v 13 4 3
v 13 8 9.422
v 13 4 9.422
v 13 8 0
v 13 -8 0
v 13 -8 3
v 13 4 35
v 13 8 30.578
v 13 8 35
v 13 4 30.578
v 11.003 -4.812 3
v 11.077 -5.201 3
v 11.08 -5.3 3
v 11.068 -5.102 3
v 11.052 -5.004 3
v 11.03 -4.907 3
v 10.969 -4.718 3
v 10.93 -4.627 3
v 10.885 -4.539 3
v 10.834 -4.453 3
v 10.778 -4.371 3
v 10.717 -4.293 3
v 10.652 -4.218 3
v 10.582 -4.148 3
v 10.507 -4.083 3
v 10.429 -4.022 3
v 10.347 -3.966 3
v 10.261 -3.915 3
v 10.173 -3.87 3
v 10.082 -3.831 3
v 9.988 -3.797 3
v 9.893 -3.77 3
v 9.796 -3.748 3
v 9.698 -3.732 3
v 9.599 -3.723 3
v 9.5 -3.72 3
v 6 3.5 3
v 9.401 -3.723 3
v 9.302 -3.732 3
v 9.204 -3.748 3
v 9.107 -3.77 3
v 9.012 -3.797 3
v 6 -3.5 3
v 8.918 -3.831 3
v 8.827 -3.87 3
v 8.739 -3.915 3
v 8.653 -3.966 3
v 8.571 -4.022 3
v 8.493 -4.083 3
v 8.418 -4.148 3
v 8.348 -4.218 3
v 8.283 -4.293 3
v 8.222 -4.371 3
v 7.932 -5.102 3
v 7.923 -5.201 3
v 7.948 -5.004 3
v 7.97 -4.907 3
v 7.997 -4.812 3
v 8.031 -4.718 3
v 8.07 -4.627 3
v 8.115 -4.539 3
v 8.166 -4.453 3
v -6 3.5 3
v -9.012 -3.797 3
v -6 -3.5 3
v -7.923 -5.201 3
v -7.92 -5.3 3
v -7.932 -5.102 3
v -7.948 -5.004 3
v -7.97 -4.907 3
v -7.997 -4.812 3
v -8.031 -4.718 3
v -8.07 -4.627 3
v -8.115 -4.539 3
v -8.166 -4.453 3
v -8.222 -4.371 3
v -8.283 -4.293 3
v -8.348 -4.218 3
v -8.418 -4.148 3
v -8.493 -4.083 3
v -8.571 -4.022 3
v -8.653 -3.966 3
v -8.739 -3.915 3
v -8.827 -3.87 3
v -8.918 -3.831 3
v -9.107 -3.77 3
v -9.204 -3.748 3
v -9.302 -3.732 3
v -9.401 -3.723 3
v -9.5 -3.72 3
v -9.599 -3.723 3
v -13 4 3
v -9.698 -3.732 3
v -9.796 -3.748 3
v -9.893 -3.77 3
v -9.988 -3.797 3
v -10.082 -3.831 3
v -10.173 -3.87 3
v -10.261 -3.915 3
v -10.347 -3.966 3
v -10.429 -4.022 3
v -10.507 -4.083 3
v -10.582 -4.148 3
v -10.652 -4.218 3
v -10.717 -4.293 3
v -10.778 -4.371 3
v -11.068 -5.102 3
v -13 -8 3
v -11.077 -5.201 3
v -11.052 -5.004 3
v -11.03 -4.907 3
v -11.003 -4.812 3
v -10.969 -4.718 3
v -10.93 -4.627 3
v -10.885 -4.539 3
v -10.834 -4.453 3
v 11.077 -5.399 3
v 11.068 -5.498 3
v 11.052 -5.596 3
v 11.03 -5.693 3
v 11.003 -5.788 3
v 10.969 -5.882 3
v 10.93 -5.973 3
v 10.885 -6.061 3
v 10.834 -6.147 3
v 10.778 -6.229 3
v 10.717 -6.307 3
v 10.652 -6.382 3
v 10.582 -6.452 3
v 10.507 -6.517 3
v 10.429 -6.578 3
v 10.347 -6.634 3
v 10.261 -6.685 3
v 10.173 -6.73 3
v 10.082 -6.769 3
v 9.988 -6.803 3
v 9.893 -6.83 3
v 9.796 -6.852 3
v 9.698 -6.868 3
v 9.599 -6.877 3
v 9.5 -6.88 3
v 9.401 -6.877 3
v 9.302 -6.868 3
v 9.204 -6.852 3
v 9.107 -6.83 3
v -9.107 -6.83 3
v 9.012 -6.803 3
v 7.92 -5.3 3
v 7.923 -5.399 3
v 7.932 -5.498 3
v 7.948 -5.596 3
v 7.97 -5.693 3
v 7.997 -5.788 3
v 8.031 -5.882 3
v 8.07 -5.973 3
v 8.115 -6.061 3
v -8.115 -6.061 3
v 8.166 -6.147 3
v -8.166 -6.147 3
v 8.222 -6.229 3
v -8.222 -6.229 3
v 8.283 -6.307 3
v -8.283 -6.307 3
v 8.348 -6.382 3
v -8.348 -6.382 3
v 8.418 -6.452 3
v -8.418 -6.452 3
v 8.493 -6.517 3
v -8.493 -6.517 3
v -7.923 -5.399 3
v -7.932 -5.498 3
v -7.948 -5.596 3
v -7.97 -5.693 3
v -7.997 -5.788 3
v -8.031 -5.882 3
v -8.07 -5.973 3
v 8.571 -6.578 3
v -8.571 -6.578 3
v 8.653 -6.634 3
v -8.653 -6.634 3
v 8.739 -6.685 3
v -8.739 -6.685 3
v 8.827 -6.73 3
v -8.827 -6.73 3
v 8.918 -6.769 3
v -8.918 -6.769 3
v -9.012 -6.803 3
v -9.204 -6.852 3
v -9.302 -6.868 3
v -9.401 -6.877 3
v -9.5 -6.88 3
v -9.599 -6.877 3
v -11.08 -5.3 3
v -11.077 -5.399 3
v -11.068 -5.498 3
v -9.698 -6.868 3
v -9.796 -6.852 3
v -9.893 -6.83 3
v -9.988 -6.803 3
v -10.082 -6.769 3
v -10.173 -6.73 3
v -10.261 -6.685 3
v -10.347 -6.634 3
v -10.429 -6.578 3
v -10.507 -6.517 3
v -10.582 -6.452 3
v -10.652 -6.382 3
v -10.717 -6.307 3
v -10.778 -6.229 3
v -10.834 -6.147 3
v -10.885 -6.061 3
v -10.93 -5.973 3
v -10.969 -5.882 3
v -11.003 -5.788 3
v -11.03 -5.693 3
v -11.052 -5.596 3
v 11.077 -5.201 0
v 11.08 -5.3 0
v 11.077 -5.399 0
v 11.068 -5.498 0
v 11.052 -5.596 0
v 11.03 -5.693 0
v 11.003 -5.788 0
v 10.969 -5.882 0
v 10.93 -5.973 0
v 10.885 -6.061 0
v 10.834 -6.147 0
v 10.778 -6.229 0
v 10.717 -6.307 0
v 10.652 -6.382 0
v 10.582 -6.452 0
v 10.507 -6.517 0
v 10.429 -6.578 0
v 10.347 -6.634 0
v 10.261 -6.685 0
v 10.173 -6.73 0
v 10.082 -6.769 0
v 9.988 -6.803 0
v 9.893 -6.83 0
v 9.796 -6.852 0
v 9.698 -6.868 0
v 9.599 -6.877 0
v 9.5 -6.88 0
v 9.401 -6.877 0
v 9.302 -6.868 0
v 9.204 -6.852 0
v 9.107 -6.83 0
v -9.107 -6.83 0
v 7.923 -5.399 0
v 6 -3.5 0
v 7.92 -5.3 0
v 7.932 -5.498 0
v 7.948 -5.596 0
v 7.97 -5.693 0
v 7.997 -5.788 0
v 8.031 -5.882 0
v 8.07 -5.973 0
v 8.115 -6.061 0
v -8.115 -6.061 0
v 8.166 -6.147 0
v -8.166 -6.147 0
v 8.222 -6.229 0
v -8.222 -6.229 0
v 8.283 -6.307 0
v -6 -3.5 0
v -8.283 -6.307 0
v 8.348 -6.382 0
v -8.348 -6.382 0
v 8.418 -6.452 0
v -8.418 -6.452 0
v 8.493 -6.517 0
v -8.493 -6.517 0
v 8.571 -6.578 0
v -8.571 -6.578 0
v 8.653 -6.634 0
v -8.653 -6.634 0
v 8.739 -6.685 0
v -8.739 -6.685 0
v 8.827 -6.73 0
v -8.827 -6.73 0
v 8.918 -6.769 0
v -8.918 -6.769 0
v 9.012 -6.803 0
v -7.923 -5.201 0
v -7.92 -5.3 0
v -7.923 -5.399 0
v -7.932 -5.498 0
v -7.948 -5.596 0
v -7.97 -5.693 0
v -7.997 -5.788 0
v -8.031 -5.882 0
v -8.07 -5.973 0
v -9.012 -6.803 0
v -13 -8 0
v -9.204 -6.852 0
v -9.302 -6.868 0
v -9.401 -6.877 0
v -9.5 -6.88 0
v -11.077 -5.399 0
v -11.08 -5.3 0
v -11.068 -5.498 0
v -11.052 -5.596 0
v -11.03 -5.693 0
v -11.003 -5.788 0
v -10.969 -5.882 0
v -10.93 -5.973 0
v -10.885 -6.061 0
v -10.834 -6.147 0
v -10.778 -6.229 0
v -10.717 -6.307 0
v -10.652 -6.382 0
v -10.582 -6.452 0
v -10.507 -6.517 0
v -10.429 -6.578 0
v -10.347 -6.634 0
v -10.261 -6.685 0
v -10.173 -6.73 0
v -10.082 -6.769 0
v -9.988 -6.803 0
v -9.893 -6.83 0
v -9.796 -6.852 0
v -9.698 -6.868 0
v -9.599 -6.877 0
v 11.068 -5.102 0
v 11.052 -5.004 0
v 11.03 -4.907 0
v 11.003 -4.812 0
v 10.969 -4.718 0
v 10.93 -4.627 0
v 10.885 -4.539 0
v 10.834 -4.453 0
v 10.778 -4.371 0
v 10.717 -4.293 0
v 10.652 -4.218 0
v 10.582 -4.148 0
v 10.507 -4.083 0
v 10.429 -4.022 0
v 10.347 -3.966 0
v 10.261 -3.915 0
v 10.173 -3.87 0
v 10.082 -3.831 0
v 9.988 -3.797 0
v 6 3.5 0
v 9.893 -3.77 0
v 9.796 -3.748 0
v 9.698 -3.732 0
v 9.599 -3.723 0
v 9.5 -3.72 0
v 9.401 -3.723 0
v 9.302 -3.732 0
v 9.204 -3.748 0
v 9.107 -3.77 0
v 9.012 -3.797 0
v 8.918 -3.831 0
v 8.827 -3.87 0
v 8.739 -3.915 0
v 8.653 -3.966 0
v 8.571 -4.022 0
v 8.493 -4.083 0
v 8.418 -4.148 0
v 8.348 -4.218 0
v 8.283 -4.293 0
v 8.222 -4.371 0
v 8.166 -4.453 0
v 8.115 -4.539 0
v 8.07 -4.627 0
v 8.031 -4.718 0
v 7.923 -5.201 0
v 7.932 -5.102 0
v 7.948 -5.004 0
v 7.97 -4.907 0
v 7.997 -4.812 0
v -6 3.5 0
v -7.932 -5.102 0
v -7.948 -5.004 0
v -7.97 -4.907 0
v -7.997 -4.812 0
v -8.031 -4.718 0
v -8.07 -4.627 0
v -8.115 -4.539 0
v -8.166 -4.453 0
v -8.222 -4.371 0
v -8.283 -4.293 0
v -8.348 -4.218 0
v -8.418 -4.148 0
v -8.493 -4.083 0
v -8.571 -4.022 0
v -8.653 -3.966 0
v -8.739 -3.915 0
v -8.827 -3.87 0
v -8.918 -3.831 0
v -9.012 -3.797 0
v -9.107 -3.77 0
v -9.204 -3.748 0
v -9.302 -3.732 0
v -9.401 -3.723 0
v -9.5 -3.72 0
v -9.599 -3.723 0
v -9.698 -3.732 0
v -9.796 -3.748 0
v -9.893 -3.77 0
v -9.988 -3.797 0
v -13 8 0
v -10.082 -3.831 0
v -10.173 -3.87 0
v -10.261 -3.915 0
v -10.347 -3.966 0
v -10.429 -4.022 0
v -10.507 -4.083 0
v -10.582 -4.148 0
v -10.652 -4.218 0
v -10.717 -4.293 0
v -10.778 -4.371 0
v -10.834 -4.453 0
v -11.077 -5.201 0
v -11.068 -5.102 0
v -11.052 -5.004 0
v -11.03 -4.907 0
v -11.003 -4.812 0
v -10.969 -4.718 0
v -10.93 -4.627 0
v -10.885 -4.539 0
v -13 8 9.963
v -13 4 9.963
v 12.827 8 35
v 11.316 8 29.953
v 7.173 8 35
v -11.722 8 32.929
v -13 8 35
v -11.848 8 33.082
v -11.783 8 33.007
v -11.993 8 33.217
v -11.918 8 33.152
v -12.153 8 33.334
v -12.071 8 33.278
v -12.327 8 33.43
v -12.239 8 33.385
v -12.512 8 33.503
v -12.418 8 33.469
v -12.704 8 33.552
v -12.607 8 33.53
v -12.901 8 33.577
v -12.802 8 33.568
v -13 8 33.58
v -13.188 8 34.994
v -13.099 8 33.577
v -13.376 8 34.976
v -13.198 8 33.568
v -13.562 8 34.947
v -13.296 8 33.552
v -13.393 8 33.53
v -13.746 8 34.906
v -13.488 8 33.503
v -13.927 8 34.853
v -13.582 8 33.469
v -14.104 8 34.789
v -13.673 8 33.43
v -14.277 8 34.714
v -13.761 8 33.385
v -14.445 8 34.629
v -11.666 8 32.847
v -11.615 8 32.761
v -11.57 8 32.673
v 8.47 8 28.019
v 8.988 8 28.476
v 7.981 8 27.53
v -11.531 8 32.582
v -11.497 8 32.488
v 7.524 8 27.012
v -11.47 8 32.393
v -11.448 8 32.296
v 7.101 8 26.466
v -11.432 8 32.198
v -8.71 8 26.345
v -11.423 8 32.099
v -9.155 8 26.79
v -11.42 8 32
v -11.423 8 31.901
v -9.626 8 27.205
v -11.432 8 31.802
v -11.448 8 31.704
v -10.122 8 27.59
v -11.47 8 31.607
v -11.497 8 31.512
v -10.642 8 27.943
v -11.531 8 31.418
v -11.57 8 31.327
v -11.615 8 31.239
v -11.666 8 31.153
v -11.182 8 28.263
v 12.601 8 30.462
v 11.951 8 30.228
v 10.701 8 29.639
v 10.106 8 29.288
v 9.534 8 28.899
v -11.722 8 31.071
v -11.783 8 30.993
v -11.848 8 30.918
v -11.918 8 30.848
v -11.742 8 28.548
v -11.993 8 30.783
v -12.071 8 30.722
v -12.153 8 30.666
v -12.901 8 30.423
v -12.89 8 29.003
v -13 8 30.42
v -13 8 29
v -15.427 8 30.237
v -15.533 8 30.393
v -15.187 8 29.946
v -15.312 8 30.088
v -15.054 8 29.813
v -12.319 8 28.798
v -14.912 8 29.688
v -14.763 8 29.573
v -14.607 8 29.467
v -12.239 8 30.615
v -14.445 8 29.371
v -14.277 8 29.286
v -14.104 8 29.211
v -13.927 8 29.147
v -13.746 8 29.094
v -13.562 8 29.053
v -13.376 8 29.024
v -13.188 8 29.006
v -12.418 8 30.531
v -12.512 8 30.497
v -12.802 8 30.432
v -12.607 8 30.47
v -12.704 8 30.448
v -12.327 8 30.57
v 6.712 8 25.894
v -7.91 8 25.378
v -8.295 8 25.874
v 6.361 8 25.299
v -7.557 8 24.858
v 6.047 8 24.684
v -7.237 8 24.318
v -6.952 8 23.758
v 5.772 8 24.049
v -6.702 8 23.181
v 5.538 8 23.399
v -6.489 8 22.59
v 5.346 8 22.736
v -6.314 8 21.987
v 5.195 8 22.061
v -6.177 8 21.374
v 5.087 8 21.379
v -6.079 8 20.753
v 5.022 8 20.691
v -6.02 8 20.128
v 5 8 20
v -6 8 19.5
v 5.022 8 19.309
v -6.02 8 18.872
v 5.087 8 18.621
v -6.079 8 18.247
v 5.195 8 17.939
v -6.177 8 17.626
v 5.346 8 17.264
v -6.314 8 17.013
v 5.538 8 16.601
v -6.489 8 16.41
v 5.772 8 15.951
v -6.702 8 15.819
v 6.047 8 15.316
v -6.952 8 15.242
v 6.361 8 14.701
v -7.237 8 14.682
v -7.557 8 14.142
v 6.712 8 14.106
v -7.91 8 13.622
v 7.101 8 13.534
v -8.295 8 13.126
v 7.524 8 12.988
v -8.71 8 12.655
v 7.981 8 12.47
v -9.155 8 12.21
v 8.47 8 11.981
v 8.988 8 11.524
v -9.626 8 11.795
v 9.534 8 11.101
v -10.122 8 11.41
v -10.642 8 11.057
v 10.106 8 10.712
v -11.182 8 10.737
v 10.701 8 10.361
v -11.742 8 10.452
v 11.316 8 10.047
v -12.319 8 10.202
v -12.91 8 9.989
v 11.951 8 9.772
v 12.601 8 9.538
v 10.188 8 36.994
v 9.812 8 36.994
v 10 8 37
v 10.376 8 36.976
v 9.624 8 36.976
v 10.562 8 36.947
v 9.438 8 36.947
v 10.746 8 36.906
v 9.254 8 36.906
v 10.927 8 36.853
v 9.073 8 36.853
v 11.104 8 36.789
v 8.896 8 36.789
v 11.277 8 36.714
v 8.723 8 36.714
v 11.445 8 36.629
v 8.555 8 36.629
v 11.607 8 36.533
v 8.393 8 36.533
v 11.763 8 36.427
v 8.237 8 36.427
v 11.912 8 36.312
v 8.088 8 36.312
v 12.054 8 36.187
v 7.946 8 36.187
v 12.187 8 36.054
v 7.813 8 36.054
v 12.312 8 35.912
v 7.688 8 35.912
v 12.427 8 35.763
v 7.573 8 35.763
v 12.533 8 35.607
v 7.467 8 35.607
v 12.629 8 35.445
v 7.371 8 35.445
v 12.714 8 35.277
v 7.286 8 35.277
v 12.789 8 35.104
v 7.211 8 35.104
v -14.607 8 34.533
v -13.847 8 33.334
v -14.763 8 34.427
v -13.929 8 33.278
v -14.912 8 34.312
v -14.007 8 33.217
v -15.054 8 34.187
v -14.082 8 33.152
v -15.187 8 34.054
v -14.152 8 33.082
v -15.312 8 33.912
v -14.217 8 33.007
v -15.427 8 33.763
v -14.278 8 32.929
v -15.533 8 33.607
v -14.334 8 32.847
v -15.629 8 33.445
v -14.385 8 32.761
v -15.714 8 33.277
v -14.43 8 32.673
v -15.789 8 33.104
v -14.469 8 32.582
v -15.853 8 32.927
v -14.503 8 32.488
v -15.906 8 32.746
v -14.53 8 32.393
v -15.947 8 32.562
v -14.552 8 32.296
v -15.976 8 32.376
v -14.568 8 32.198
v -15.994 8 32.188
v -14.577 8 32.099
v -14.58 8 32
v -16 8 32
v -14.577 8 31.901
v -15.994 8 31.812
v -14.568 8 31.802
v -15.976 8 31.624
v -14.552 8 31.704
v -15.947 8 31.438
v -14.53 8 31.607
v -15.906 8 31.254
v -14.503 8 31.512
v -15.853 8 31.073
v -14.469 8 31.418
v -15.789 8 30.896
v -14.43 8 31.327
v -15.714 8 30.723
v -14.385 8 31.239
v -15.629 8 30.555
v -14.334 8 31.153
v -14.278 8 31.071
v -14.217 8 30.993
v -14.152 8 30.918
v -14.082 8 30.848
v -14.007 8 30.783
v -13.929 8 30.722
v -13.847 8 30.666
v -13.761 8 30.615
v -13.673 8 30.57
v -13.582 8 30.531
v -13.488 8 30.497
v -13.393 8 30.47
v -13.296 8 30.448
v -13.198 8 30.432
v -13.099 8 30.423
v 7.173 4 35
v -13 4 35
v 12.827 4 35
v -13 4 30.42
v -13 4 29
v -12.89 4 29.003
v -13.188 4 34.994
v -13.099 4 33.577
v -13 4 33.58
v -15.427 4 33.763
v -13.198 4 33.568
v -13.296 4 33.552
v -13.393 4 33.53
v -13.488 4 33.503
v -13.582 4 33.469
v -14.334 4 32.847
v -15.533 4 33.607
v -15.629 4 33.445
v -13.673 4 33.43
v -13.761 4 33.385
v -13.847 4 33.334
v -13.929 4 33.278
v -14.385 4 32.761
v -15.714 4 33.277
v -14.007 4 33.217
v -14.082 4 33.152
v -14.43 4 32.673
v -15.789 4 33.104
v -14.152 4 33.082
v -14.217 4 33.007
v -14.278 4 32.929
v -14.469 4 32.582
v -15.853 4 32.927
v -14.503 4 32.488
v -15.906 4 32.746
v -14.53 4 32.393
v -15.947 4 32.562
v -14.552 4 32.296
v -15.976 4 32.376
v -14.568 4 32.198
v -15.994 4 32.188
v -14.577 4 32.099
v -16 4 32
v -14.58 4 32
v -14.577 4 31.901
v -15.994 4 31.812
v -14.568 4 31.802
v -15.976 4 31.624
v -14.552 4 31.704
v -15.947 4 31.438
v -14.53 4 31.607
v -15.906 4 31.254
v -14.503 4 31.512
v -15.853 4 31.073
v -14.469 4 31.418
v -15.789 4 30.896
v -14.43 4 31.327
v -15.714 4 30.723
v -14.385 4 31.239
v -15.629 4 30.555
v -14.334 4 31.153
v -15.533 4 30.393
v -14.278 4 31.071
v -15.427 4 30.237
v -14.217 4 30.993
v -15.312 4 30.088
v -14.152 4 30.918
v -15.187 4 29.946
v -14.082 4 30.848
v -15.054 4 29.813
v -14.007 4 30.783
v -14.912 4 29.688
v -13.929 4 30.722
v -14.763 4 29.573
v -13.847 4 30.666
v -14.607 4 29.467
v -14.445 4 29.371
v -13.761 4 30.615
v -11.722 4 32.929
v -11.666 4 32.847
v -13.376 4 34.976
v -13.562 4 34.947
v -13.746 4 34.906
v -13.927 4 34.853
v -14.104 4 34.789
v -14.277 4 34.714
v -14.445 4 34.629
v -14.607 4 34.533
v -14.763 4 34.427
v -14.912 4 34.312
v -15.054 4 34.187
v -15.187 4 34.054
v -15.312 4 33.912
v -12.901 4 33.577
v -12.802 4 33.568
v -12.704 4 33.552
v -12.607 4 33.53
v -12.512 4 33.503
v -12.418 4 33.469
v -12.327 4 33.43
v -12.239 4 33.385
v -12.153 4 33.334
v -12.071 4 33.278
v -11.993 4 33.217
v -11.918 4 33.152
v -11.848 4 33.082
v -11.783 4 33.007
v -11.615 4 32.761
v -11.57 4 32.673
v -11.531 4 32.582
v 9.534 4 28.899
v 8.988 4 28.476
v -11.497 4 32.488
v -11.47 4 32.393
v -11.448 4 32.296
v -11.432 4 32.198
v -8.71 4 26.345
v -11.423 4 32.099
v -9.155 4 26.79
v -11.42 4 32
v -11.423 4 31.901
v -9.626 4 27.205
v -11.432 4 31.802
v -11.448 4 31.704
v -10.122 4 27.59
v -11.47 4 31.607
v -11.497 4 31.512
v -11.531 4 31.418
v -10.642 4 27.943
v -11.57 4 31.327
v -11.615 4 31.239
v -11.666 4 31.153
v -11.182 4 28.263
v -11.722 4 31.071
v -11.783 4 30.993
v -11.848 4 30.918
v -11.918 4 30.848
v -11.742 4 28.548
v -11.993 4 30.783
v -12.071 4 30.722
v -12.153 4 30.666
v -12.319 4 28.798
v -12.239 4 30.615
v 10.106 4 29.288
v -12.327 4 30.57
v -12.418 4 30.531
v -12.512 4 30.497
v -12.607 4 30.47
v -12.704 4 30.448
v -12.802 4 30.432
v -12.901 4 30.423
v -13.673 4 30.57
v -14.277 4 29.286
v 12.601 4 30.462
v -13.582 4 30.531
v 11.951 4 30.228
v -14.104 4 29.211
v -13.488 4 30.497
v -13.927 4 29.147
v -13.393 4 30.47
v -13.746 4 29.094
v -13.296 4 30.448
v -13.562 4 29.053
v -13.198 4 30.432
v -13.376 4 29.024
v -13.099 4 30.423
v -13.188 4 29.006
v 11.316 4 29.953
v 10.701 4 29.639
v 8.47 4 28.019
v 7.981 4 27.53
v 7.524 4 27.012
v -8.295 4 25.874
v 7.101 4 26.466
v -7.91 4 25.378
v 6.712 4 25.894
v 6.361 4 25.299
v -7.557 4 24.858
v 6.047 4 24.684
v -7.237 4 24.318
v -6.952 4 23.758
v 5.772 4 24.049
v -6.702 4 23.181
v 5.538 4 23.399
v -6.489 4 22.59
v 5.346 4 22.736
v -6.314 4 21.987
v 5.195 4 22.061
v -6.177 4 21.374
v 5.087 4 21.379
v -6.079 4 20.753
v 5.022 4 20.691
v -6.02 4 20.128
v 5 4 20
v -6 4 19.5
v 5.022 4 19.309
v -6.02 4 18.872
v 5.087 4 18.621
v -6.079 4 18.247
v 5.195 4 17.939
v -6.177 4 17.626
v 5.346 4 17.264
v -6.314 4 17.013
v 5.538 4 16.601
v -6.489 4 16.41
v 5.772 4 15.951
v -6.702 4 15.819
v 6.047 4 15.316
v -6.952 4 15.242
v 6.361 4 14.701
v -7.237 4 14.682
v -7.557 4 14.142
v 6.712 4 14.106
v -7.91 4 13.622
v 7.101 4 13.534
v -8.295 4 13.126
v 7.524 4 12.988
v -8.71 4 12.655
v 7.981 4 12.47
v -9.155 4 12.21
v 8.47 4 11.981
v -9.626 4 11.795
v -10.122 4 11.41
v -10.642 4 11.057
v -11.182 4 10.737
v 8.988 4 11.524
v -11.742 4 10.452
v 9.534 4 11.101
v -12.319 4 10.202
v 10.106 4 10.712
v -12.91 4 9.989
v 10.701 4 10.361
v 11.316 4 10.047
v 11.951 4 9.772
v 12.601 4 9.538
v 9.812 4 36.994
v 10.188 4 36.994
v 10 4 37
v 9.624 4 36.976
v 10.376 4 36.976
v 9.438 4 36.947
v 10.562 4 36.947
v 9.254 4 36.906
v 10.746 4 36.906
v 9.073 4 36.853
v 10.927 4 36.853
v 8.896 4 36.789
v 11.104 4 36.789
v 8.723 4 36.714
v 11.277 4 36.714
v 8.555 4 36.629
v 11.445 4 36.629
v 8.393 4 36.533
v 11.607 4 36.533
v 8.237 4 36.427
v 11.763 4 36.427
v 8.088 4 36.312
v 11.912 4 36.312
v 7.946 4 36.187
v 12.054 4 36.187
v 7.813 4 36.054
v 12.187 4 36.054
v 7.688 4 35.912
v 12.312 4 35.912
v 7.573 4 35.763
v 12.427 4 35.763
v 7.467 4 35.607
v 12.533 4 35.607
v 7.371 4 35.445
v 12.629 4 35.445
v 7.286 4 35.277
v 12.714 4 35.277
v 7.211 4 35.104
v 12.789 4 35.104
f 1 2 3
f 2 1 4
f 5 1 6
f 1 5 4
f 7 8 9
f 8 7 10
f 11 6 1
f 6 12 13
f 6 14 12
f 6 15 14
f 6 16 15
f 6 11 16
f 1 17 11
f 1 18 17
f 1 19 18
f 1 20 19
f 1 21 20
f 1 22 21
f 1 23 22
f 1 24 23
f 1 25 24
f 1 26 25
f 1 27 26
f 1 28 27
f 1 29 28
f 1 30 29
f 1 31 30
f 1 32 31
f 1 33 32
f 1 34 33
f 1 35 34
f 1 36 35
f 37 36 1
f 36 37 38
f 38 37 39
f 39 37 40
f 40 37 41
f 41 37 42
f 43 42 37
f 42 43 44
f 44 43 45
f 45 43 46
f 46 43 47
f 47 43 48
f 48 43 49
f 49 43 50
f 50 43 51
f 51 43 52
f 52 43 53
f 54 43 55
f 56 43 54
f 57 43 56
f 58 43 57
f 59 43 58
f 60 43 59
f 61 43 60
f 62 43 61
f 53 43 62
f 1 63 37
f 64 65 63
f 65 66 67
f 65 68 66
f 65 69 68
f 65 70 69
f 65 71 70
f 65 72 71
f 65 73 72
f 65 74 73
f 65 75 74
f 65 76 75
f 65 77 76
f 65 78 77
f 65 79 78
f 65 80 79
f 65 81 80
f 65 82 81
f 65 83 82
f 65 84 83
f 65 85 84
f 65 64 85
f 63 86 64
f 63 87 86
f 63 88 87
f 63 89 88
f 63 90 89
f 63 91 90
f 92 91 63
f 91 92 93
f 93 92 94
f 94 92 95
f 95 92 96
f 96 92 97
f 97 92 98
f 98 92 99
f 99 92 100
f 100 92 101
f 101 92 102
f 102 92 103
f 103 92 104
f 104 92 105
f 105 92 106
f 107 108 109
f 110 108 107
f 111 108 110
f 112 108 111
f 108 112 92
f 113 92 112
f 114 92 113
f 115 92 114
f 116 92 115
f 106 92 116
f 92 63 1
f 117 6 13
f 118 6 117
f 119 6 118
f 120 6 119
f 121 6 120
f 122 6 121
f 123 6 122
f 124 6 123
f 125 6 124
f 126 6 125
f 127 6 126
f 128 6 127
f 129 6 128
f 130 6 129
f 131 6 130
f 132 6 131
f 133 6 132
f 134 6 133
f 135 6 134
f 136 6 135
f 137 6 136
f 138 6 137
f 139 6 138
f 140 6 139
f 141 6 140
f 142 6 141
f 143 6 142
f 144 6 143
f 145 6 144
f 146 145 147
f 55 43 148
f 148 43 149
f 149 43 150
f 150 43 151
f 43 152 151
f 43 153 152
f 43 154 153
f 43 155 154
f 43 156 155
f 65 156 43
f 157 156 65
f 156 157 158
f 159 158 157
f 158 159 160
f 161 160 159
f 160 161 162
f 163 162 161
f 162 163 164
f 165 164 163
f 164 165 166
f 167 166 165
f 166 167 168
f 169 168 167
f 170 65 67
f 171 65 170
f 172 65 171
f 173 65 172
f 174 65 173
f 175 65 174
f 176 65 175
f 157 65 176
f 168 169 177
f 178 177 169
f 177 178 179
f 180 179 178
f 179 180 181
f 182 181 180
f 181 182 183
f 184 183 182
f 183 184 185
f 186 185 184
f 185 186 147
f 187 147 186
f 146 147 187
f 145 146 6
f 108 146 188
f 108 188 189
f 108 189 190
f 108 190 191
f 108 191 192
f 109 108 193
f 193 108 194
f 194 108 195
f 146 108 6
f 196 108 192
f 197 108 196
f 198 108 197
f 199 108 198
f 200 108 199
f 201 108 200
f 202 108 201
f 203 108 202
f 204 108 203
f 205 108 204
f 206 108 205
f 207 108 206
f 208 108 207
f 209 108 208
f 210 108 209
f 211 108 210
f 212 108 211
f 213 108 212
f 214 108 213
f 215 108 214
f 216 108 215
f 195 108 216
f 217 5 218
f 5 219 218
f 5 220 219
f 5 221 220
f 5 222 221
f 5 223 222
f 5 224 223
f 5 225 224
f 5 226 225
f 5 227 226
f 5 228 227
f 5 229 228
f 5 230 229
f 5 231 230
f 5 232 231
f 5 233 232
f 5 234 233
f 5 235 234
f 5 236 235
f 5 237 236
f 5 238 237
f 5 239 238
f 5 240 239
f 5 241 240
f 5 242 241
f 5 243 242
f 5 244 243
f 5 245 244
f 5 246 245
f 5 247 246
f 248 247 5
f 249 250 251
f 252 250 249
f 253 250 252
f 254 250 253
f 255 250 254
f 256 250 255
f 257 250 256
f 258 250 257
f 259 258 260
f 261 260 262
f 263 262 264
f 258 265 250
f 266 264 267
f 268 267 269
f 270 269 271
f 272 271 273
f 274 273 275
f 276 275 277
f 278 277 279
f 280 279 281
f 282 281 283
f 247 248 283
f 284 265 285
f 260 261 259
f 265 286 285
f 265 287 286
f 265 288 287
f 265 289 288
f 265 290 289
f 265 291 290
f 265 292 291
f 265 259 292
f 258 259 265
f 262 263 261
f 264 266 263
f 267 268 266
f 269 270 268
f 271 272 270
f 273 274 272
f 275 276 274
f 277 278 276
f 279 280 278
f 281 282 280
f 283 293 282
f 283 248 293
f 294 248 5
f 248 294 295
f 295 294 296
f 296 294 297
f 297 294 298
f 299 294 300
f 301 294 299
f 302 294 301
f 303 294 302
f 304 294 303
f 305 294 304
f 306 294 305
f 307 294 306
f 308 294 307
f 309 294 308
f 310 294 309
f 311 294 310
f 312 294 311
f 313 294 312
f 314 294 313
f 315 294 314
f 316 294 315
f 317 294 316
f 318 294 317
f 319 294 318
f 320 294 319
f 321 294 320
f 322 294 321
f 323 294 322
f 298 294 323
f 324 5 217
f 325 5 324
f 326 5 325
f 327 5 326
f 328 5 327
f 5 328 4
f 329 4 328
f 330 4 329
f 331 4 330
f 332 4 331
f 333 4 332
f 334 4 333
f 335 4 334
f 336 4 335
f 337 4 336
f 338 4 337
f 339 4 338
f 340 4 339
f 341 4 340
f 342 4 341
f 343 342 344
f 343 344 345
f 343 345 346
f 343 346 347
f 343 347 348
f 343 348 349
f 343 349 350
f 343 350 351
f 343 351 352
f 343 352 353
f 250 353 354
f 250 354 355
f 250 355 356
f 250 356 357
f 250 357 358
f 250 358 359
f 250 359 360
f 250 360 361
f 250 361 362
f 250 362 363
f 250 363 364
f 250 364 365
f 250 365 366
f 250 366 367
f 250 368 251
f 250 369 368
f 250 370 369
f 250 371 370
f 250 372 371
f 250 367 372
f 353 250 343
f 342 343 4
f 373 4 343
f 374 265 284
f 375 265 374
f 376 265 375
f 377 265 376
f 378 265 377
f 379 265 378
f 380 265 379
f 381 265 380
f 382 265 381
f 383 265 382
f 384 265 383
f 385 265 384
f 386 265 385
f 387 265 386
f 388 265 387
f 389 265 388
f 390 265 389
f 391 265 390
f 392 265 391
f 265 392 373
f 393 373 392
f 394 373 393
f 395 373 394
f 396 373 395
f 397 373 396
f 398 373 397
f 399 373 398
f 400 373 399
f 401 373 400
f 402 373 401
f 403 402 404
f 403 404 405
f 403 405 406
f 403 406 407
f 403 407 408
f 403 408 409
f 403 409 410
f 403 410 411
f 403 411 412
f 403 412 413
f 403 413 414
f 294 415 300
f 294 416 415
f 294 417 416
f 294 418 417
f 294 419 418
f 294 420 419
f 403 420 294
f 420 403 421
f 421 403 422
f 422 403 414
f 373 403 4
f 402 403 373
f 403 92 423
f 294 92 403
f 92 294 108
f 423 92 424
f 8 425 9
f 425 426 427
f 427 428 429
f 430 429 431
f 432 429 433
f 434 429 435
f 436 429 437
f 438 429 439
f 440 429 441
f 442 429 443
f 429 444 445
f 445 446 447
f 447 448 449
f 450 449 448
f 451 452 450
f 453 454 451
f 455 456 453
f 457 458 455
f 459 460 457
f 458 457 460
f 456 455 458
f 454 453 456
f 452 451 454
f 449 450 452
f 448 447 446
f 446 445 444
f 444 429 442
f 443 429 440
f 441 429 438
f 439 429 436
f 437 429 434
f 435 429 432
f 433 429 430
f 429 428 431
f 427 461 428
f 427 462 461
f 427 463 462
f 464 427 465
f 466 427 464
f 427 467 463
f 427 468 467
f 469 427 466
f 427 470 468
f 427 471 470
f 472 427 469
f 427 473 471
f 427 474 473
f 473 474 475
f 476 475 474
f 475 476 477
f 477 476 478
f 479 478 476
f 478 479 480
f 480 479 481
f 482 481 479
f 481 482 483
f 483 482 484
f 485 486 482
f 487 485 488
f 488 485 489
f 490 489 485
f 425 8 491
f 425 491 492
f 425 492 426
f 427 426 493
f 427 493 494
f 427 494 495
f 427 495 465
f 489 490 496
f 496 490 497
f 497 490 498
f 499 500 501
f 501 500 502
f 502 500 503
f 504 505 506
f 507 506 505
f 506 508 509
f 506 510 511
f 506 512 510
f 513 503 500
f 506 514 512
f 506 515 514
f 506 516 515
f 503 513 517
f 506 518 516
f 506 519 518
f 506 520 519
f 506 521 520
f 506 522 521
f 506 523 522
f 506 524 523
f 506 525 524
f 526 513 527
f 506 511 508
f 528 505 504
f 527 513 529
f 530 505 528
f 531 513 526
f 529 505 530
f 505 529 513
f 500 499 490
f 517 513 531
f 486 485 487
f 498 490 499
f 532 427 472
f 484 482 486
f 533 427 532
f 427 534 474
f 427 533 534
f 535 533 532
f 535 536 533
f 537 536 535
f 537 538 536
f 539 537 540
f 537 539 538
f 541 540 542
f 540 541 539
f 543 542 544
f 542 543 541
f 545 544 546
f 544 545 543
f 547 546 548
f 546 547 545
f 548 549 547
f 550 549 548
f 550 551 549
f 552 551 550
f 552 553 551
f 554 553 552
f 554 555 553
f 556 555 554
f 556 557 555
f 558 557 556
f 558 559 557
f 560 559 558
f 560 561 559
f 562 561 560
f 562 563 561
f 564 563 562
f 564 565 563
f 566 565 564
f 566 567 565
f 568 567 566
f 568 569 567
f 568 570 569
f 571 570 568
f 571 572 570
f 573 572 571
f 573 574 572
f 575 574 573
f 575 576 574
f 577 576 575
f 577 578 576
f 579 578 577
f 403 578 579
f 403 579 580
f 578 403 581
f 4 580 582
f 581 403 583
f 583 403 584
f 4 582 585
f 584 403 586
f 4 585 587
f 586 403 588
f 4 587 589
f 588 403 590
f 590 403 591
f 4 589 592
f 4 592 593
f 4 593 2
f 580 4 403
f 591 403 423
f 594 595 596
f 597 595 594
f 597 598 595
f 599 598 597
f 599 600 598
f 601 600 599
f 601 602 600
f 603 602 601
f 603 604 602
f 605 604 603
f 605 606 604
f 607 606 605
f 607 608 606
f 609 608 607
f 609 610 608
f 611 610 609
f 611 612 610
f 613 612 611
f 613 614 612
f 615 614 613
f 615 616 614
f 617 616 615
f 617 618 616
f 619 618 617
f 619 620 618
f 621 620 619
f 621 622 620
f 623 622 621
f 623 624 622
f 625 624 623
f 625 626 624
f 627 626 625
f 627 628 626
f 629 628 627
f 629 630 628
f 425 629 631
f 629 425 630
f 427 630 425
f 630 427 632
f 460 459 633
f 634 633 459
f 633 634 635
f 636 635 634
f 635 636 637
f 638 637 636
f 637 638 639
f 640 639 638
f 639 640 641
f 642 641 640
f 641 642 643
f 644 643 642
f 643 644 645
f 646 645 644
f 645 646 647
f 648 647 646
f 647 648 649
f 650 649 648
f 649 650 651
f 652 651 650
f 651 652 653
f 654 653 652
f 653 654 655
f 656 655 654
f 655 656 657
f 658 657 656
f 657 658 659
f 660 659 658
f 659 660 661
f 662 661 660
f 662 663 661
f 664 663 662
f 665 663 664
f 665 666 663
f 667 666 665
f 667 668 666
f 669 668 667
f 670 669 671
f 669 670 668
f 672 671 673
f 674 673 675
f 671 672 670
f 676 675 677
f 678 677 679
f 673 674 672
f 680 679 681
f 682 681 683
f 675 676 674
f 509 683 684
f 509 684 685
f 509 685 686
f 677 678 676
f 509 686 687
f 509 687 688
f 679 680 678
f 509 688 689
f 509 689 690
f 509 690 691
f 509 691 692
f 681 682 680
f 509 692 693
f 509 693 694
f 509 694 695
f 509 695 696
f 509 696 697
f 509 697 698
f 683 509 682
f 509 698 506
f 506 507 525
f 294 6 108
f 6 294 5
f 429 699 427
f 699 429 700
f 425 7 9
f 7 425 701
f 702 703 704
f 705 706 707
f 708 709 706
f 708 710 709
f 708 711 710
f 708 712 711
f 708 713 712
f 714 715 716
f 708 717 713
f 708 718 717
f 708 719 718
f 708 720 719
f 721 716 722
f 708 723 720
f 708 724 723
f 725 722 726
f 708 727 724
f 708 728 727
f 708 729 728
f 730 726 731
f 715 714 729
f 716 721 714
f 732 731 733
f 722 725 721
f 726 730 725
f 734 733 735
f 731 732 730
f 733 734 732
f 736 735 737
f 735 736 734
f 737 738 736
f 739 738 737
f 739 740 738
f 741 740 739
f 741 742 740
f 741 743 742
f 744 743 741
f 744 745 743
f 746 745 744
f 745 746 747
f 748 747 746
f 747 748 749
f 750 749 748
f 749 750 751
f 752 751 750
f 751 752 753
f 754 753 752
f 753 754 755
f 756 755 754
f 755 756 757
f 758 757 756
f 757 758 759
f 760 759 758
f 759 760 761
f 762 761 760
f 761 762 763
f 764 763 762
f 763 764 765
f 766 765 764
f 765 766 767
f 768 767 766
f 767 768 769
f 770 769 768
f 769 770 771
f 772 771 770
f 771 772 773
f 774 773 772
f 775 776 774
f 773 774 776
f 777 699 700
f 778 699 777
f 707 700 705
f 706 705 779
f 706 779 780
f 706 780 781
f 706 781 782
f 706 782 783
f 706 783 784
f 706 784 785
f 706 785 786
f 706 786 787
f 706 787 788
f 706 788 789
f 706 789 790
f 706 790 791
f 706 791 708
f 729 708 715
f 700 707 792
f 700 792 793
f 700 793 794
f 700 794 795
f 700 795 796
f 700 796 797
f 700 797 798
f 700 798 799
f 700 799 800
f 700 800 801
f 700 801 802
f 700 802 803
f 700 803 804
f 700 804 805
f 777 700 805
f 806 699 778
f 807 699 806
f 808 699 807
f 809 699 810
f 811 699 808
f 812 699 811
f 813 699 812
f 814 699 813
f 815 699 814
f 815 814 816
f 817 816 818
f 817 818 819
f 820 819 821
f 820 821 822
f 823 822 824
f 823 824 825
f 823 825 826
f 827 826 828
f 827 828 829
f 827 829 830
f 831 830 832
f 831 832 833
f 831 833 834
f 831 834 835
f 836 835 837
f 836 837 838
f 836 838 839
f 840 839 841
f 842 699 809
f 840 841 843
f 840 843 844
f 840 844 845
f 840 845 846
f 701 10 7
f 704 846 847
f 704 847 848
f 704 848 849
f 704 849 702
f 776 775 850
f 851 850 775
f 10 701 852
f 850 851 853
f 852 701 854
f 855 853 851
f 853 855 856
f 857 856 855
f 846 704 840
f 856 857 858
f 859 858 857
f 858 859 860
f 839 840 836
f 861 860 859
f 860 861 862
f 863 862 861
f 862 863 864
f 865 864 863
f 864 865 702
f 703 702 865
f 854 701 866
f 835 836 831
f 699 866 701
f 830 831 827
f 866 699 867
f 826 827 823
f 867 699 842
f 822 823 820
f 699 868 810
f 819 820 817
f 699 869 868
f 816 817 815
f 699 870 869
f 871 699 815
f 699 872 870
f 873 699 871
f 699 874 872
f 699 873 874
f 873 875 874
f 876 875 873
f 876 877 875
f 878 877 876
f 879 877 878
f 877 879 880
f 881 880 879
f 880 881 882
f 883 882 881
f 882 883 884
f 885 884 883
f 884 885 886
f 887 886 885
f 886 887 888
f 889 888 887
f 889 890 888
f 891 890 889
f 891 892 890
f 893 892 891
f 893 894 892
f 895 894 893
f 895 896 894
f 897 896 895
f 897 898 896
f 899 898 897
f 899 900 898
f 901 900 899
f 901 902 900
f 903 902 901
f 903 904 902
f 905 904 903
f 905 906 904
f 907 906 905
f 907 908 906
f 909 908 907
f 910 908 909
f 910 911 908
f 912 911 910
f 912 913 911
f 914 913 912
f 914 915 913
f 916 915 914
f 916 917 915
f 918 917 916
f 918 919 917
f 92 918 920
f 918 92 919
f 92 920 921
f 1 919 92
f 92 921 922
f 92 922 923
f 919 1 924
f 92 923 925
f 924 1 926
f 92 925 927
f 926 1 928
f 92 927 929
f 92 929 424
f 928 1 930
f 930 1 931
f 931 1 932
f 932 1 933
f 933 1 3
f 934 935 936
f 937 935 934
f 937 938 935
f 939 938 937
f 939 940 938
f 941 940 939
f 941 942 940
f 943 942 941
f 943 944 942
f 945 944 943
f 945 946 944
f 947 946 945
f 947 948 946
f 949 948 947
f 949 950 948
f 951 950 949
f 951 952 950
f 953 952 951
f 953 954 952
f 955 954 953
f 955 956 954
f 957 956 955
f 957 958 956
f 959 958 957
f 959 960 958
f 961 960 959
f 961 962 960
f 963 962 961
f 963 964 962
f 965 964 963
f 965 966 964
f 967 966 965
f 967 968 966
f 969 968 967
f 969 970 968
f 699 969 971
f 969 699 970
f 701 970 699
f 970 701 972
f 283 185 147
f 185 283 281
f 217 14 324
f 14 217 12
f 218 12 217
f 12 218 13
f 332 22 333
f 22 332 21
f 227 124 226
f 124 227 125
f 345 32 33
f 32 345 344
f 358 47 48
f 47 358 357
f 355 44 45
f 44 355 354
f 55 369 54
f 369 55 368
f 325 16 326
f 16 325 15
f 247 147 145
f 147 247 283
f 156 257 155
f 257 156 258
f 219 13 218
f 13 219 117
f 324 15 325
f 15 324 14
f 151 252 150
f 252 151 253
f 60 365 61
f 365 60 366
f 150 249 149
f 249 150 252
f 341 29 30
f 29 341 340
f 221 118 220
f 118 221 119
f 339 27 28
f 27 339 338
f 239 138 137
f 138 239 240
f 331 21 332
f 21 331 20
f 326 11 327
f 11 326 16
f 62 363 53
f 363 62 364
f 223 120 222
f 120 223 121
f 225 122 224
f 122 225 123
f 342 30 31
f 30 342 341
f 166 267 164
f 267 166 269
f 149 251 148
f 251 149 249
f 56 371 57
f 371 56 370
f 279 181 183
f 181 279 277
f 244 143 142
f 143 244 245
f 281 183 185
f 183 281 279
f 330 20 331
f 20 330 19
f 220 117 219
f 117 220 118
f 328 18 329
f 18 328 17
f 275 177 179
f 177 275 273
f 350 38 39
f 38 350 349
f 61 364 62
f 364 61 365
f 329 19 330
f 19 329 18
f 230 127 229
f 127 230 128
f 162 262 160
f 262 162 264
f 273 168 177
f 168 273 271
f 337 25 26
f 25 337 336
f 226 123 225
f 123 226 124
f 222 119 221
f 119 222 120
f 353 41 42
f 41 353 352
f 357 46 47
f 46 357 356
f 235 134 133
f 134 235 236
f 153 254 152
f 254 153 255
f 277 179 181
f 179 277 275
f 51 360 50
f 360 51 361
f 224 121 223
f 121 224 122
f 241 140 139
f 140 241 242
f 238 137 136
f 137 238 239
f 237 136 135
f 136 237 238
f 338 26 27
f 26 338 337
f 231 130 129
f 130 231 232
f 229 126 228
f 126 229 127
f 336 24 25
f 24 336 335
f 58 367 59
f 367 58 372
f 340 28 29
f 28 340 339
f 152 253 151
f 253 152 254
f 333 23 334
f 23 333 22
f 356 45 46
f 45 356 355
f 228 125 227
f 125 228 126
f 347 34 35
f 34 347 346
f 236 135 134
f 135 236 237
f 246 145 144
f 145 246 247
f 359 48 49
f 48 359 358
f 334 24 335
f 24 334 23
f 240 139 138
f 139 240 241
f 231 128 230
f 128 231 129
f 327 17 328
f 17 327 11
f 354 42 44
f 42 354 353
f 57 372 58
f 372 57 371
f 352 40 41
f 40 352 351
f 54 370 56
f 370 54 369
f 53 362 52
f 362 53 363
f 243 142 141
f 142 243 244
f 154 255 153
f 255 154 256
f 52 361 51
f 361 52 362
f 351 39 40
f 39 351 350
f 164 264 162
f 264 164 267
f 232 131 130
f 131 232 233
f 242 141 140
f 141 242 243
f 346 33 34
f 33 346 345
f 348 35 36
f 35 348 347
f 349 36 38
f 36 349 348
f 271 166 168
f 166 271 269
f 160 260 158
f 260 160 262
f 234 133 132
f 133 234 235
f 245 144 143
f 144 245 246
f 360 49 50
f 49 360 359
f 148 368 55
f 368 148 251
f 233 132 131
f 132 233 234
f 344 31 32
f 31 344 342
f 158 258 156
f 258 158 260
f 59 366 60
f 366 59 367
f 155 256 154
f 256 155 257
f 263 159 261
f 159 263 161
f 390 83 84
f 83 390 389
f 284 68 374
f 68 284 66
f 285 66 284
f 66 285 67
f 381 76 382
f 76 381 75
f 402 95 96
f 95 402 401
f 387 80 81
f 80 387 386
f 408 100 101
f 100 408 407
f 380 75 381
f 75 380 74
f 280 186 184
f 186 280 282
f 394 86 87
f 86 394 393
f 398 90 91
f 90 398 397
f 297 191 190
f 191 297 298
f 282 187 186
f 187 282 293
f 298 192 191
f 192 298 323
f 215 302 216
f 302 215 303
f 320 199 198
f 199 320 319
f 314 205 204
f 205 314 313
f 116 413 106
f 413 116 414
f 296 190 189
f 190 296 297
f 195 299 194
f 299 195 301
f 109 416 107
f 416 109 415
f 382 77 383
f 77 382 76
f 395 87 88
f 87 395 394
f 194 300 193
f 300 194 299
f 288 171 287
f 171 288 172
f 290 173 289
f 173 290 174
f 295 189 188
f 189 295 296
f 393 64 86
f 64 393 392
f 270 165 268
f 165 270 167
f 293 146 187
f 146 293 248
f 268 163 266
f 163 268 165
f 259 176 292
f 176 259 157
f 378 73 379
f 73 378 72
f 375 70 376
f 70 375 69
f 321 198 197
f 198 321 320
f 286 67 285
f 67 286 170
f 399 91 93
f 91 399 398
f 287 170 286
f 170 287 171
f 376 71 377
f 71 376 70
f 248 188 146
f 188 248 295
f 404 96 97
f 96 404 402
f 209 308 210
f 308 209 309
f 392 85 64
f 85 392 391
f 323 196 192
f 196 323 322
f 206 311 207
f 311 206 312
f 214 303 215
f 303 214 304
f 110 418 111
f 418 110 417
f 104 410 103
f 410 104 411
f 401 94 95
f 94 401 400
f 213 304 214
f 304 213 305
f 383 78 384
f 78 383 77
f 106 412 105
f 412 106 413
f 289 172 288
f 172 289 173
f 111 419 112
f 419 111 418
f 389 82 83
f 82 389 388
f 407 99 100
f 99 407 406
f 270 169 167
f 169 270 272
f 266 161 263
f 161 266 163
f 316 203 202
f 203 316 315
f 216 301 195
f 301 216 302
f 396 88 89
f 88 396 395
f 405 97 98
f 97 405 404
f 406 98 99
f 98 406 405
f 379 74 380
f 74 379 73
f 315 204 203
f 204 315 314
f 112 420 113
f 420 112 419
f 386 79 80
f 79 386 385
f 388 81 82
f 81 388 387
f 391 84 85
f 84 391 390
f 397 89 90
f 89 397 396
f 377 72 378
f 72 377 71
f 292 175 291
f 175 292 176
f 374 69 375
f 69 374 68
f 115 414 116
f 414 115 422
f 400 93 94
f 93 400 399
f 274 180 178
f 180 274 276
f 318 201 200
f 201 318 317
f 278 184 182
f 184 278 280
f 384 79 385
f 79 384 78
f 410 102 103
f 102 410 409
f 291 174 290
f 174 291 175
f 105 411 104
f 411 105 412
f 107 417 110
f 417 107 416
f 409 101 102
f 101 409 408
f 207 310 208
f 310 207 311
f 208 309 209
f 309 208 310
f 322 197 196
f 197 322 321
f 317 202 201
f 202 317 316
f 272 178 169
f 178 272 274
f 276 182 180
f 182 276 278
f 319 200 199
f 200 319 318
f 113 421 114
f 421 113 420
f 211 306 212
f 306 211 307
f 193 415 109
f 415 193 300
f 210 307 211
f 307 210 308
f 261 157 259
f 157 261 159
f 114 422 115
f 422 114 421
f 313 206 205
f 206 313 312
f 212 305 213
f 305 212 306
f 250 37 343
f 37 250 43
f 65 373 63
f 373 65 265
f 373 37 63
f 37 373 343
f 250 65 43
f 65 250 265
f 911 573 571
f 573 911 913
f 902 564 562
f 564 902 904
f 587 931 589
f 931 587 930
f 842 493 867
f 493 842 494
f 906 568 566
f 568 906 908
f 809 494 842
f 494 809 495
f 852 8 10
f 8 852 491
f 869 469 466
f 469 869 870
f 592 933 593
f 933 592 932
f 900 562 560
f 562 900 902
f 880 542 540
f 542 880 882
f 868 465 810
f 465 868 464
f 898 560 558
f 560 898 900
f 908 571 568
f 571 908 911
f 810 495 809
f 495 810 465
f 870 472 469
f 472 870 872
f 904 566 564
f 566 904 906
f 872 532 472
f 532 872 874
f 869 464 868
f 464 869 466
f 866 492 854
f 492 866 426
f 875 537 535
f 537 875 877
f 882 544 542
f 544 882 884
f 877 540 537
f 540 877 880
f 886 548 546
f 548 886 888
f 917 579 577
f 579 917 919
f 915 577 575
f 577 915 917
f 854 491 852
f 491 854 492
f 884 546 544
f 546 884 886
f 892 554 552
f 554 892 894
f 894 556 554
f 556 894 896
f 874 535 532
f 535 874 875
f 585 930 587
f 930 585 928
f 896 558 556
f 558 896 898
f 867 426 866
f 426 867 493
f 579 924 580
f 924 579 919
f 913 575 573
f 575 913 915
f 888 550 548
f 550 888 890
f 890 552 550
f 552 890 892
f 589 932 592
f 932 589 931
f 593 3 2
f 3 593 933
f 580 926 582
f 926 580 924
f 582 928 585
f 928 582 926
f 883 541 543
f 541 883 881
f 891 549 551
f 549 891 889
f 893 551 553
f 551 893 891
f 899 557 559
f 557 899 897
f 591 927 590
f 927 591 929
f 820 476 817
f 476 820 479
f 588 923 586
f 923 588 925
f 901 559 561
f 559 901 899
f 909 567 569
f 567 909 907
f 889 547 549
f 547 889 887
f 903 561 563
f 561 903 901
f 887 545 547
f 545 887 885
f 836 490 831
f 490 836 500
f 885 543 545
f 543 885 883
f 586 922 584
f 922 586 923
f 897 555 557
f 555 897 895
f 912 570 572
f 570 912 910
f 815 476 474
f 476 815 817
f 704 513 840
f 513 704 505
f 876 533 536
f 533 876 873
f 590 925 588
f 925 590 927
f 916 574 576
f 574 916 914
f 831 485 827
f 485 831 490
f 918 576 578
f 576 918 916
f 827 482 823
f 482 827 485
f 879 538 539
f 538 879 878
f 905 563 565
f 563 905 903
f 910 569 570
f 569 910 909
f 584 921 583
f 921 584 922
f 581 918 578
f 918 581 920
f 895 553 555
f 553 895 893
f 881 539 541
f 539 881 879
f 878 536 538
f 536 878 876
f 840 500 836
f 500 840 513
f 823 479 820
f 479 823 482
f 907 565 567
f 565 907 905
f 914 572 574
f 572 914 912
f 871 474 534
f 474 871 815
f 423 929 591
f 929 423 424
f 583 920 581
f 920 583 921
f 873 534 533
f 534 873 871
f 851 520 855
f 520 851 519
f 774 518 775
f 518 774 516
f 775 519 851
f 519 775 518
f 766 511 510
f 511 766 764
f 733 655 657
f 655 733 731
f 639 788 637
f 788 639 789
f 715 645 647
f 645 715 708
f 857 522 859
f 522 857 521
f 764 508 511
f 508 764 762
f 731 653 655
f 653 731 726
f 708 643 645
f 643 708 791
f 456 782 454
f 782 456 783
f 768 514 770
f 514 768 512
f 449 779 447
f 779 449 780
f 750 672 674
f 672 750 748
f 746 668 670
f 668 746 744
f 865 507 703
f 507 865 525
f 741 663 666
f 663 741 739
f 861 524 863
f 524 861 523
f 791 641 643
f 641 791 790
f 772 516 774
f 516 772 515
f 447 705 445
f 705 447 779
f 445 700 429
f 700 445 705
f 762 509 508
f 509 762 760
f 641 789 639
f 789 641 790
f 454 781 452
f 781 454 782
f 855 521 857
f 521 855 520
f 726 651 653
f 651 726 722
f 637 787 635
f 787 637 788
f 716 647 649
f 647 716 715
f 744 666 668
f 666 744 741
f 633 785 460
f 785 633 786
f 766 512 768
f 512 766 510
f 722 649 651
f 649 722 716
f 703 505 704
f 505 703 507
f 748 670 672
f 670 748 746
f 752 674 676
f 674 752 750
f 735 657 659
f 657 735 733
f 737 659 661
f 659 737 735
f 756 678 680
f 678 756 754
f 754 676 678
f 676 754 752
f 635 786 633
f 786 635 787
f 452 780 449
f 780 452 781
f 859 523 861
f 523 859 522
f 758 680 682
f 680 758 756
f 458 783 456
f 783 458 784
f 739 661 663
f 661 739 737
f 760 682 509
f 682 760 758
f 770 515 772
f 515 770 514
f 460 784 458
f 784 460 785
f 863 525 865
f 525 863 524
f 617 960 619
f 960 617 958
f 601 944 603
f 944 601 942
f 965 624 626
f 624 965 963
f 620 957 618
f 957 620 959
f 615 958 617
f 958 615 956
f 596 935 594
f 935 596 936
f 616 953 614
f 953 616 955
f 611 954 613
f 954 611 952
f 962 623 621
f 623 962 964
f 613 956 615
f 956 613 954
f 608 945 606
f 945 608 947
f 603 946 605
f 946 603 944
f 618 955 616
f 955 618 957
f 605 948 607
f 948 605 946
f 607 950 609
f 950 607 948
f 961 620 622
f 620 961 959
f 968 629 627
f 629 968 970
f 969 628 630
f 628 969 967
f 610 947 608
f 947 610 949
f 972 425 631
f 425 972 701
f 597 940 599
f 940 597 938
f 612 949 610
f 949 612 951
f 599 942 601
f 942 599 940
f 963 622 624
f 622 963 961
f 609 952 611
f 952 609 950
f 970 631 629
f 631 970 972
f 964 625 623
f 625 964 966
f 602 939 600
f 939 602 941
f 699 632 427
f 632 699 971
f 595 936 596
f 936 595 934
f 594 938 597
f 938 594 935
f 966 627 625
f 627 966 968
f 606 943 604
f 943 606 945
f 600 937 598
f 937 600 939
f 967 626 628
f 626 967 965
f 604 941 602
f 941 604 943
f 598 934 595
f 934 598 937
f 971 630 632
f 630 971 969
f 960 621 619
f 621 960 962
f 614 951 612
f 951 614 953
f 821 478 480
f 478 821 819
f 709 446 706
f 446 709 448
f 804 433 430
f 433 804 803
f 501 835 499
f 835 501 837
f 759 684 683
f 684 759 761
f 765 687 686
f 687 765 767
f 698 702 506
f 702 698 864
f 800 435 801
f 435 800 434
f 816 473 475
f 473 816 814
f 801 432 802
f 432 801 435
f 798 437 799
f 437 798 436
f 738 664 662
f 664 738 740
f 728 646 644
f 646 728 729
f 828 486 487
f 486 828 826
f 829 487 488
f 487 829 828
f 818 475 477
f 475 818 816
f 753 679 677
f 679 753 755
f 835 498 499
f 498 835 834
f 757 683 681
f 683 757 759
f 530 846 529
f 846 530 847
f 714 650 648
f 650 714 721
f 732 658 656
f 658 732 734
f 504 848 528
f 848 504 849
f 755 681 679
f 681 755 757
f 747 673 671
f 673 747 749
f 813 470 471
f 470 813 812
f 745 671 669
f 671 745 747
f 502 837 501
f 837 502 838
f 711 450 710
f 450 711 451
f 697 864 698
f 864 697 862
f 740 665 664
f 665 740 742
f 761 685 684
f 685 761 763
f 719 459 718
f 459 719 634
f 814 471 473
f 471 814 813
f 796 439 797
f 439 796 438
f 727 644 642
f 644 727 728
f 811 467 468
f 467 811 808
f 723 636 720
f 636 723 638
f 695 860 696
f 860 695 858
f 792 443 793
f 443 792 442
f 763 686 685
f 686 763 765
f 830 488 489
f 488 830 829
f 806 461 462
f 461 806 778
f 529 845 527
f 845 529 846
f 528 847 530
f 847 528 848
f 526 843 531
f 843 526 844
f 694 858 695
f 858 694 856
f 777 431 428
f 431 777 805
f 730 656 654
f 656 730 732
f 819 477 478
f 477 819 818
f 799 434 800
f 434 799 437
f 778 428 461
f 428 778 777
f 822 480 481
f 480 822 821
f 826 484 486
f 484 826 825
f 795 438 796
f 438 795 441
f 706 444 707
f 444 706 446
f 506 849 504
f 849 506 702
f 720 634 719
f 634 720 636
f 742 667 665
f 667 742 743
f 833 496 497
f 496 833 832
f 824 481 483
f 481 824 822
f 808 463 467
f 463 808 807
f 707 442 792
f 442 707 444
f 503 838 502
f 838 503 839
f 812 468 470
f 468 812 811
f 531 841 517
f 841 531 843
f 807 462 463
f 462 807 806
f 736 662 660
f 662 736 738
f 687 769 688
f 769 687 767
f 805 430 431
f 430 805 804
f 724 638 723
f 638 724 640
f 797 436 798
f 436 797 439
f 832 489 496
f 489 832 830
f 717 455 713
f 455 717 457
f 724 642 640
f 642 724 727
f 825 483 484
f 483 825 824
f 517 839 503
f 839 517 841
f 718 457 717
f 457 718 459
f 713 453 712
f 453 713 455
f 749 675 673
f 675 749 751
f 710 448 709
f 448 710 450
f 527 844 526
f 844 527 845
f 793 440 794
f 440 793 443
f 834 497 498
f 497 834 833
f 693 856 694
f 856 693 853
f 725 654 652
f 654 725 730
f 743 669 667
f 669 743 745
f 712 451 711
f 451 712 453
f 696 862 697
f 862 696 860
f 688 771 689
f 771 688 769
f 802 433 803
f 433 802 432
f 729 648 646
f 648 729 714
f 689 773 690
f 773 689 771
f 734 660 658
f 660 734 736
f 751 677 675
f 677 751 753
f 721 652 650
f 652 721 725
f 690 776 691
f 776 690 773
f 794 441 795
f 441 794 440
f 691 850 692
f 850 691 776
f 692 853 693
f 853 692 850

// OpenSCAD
//---------------------------------------------------------------
//--  Eje Y final de carrera marco.  (c) Antonio Castro Gómez
//---------------------------------------------------------------
//-- Released under the GPL license
//---------------------------------------------------------------

difference()
{
	union()
	{	
		difference()
		{
			union()
			{
				translate([0,0,1.5])cube(size=[26,16,3], center=true);
				translate([0,6,17.5])cube(size=[26,4,35], center=true);
			}
			//agujeros para tornillos M3
			translate([9.5,-5.3,0])cylinder(h=10,r=1.58,$fn=100,center=true);
			translate([-9.5,-5.3,0])cylinder(h=10,r=1.58,$fn=100,center=true);
			//agujero para soldaduras
			translate([0,0,0])cube(size=[12,7,10], center=true);
			//curvas esteticas
			translate([16,0,20])rotate([90,0,0])cylinder(h=30,r=11,$fn=100,center=true);
			translate([-16,0,19.5])rotate([90,0,0])cylinder(h=30,r=10,$fn=100,center=true);
		}

		translate([-13,6,32])rotate([90,0,0])cylinder(h=4,r=3,$fn=100,center=true);
		translate([10,6,34])rotate([90,0,0])cylinder(h=4,r=3,$fn=100,center=true);
	}

	translate([-13,7,32])rotate([90,0,0])cylinder(h=10,r=1.58,$fn=100,center=true);
}
